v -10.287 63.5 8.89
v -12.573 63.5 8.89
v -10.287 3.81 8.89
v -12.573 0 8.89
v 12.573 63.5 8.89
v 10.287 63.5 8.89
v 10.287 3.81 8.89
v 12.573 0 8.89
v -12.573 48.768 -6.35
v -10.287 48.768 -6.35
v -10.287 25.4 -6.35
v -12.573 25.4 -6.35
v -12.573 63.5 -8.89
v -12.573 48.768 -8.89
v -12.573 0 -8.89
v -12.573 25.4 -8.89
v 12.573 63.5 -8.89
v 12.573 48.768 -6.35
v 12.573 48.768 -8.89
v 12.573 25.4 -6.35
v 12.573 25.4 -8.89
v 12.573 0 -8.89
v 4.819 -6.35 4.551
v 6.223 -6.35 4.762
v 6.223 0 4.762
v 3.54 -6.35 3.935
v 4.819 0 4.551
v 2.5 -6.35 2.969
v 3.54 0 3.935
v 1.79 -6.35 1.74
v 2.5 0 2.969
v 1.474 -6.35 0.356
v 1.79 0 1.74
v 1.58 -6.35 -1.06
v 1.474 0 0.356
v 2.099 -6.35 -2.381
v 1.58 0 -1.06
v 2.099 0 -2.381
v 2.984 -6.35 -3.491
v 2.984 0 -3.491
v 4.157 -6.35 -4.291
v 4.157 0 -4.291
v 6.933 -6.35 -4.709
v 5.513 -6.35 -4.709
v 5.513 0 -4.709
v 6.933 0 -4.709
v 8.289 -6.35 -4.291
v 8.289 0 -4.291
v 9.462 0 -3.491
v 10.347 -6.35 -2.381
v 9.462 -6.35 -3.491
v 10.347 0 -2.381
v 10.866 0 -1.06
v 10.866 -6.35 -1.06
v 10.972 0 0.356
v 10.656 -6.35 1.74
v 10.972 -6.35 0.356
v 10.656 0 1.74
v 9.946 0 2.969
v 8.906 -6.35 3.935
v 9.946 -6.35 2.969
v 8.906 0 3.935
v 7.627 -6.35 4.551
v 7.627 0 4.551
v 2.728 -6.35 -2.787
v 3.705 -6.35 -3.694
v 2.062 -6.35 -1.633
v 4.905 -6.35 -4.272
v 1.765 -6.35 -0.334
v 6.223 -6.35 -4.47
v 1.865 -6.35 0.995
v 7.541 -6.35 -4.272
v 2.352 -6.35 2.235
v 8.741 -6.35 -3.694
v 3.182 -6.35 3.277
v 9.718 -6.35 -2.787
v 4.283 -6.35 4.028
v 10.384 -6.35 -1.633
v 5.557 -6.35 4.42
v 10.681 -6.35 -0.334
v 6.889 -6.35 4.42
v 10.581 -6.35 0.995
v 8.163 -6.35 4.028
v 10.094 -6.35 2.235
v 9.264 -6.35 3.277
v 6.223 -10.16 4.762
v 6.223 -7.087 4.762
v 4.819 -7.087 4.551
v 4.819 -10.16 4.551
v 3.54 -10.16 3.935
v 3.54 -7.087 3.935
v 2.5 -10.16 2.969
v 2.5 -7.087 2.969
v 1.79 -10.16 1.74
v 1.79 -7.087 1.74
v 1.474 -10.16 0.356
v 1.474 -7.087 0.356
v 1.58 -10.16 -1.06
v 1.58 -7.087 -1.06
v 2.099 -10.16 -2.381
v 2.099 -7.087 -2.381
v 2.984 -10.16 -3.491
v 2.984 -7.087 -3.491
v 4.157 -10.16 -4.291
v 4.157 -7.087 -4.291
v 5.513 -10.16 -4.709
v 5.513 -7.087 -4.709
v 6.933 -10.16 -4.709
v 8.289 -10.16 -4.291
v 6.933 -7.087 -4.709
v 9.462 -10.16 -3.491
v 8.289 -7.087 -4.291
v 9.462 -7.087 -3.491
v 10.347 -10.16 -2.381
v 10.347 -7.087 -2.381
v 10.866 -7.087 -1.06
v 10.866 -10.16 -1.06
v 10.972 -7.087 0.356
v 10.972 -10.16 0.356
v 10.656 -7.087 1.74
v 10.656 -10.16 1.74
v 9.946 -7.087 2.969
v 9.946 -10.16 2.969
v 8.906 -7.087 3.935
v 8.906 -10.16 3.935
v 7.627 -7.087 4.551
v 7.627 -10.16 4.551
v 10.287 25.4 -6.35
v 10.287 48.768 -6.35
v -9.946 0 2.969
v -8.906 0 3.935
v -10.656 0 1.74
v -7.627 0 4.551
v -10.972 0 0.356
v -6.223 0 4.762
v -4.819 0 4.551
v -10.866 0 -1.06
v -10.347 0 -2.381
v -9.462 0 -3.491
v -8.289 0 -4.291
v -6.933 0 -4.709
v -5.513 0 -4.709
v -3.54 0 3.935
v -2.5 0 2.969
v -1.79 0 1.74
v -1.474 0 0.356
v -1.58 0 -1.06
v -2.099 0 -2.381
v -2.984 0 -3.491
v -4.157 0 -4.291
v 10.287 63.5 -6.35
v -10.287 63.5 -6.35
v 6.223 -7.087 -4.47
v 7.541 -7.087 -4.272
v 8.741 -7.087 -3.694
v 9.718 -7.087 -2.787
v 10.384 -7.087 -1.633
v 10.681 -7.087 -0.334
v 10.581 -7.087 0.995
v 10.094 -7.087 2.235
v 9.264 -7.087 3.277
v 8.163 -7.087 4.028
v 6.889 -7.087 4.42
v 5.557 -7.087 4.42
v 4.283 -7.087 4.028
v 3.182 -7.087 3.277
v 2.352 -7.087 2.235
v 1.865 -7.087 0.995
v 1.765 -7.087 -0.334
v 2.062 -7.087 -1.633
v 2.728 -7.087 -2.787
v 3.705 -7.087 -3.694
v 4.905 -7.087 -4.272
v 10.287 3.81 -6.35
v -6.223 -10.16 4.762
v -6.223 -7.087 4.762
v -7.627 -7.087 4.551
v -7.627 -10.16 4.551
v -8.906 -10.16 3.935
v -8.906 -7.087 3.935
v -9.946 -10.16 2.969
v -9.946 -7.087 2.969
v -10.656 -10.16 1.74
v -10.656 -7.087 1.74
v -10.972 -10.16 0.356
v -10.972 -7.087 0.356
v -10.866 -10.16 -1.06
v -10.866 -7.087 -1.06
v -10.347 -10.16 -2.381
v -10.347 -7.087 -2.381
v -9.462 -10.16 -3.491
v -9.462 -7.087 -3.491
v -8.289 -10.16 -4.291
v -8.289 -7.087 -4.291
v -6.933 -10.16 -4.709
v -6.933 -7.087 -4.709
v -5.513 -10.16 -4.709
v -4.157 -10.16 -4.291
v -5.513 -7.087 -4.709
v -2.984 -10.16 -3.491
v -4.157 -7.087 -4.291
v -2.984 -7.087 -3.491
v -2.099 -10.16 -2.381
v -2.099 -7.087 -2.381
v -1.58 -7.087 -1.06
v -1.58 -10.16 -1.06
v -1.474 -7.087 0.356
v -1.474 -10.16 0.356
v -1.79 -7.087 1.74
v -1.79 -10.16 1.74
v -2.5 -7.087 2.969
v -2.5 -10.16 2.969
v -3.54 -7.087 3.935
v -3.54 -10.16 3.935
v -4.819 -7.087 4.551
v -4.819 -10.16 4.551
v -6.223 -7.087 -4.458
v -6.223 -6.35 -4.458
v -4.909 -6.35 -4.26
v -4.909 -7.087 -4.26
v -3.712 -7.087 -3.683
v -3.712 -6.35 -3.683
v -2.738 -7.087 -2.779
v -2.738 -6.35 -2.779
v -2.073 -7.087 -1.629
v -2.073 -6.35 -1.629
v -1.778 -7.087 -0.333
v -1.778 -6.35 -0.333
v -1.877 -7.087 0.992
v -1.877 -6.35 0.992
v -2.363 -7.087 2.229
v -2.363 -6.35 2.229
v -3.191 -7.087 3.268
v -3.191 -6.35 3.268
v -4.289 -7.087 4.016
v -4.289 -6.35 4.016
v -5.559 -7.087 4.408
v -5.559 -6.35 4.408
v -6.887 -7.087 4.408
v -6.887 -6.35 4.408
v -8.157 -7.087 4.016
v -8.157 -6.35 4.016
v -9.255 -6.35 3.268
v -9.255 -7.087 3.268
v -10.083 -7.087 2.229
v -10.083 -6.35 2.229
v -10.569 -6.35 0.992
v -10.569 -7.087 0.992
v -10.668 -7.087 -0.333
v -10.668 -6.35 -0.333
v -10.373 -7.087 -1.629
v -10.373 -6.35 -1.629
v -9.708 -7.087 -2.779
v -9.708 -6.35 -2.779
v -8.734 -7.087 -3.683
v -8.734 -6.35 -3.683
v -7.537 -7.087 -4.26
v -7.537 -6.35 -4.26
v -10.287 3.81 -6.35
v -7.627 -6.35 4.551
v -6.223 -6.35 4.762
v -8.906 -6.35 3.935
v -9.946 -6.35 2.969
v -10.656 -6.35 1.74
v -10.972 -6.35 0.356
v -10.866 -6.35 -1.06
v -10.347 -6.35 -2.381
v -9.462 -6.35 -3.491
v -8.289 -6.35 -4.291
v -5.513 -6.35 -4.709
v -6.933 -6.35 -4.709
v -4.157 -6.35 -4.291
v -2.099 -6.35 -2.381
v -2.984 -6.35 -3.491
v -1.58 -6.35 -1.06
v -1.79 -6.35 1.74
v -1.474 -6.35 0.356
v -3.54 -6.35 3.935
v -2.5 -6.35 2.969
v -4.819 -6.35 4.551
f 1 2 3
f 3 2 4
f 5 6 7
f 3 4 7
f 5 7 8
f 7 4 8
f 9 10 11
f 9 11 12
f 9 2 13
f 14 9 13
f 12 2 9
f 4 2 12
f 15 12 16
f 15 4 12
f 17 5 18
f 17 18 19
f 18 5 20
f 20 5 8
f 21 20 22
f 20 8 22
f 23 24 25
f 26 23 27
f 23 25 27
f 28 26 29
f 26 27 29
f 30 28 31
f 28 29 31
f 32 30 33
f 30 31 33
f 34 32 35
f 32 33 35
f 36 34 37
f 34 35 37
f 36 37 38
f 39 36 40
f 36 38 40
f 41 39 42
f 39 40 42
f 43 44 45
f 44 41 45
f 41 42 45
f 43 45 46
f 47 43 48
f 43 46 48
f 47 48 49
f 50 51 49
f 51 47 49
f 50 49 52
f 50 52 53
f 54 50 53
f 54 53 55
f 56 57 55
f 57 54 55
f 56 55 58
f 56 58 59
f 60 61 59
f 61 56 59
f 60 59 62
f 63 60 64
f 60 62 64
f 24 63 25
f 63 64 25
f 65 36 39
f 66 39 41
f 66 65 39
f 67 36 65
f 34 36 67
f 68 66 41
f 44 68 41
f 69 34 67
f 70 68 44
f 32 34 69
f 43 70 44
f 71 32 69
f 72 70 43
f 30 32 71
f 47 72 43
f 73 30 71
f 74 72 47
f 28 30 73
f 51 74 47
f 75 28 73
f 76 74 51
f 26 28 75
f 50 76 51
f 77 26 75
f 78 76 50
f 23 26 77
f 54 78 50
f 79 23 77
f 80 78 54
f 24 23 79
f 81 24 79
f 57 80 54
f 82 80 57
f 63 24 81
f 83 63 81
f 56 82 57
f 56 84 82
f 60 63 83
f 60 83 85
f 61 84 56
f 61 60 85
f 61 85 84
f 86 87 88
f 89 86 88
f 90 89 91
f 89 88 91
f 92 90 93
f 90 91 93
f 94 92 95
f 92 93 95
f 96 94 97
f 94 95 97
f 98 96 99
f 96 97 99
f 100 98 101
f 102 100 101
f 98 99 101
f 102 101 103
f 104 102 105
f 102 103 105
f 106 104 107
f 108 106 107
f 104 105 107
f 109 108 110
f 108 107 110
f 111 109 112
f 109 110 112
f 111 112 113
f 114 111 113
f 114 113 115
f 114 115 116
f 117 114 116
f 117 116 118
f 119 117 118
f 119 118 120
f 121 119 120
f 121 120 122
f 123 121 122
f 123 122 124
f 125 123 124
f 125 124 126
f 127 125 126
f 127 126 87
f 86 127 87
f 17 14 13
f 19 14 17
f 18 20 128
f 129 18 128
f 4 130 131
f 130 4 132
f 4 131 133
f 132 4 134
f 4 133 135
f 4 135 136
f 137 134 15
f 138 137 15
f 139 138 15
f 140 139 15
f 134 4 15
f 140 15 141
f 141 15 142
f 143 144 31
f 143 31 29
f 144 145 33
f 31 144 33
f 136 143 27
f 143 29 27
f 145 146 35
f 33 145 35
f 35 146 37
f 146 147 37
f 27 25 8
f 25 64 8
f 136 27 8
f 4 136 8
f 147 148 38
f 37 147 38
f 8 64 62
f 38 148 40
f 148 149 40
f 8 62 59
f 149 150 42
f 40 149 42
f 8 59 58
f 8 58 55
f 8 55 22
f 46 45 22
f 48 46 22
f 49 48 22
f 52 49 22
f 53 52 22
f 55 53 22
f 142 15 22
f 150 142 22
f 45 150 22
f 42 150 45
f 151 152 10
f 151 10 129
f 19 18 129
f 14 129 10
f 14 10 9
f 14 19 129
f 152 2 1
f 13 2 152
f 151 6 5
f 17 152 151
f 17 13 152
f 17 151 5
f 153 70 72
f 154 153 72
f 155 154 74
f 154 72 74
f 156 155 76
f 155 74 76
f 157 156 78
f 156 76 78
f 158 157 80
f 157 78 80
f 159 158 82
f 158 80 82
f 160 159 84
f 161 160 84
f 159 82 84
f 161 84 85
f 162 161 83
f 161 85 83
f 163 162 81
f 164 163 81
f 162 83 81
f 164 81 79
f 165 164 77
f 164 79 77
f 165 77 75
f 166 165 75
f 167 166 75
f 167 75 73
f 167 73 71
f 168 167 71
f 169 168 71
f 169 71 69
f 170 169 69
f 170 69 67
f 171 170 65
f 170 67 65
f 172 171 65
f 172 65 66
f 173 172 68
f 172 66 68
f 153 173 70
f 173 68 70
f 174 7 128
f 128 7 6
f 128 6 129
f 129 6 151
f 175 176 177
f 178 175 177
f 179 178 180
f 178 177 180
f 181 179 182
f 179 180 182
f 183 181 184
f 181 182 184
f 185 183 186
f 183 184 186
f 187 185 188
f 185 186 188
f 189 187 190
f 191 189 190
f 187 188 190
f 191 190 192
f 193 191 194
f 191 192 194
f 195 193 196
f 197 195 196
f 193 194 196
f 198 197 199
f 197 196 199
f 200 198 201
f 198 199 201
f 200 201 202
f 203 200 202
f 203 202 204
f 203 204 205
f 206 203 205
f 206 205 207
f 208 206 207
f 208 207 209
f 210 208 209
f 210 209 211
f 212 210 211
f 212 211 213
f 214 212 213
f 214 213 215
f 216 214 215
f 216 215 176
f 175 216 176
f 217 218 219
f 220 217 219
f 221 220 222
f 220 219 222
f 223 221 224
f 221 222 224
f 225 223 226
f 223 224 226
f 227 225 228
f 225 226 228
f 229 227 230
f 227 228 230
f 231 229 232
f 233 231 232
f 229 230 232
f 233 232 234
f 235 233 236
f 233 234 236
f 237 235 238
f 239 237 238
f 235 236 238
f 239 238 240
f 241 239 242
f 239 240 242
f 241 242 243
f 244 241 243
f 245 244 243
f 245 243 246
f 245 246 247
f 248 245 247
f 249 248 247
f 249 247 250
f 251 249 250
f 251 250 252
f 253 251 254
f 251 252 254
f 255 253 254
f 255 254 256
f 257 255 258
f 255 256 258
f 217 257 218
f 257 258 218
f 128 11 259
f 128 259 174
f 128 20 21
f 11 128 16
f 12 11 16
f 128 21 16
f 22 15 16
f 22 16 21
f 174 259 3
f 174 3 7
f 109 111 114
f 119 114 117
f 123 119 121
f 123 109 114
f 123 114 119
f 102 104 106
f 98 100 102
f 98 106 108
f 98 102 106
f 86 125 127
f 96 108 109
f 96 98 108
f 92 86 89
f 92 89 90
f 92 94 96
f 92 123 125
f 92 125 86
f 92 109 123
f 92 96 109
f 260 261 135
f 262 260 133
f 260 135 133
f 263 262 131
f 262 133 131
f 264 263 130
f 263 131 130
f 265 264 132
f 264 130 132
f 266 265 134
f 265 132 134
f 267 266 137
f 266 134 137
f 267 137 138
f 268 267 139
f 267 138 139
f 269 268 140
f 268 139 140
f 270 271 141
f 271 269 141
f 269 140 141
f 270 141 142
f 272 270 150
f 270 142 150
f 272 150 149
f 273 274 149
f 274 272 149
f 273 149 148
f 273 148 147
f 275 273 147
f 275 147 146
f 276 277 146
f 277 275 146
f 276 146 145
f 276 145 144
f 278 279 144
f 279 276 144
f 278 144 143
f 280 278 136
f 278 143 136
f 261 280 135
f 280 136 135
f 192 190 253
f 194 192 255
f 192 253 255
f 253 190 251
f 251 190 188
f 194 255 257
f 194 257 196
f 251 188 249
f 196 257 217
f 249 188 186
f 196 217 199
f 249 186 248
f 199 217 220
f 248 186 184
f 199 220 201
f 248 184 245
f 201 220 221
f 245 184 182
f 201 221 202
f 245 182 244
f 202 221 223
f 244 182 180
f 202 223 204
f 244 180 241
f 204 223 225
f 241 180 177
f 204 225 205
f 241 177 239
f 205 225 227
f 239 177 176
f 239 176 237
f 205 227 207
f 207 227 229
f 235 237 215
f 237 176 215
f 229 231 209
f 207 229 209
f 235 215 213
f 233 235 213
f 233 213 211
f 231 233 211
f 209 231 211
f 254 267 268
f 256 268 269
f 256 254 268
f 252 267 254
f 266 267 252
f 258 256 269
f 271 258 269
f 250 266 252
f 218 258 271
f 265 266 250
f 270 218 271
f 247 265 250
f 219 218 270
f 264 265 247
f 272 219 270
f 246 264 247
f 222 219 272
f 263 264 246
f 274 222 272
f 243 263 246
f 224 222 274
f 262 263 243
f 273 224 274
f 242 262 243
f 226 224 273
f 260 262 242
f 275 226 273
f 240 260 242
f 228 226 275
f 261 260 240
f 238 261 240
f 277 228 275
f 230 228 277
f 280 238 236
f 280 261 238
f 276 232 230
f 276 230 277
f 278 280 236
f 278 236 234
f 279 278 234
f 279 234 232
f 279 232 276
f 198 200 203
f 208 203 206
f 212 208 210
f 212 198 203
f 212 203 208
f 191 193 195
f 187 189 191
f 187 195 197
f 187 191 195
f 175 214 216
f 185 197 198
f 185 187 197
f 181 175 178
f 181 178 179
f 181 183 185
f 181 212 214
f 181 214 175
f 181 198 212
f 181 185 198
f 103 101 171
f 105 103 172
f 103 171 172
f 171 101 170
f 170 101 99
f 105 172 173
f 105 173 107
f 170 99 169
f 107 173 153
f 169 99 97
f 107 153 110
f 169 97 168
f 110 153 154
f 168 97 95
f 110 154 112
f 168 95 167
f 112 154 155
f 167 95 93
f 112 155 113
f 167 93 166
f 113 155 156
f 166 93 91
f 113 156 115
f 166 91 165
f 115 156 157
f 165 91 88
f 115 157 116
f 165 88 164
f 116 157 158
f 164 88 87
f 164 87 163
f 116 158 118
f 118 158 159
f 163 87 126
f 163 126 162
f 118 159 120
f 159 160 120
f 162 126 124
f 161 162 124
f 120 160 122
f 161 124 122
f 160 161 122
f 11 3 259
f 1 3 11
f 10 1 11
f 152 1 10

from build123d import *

# Parameters (mm, degrees)
SKETCH2_W           = 25.146
SKETCH2_H           = 17.78
BOSS_EXTRUDE1_DEPTH = 63.5
SKETCH3_W           = 20.574
SKETCH3_H           = 15.24
CUT_EXTRUDE1_DEPTH  = 59.69
SKETCH4_R           = 4.7625
BOSS_EXTRUDE2_DEPTH = 10.16
F_3DSKETCH1_R       = 5.08
CUT_EXTRUDE2_DEPTH  = 0.7366
SKETCH5_R           = 4.4577
SKETCH5_R_2         = 4.4704
BOSS_EXTRUDE3_DEPTH = 0.7366
SKETCH6_W           = 25.146
SKETCH6_H           = 23.368
CUT_EXTRUDE3_DEPTH  = 2.54


with BuildPart() as part:
    # Sketch2 → Boss-Extrude1 (new body)
    with BuildSketch(Plane(origin=(0, 0, 0), x_dir=(1, 0, 0), z_dir=(0, 1, 0))):
        Rectangle(SKETCH2_W, SKETCH2_H)
    extrude(amount=BOSS_EXTRUDE1_DEPTH)

    # Sketch3 → Cut-Extrude1 (cut)
    with BuildSketch(Plane(origin=(0, 63.5, 0), x_dir=(1, 0, 0), z_dir=(0, 1, 0))):
        with Locations((0, -1.27)):
            Rectangle(SKETCH3_W, SKETCH3_H)
    extrude(amount=-CUT_EXTRUDE1_DEPTH, mode=Mode.SUBTRACT)

    # Sketch4 → Boss-Extrude2 (add)
    with BuildSketch(Plane(origin=(0, 0, 0), x_dir=(-1, 0, 0), z_dir=(0, -1, 0))):
        with Locations(Location((6.223, 0, 0), (0, 0, 270))):
            Circle(SKETCH4_R)
        with Locations(Location((-6.223, 0, 0), (0, 0, 270))):
            Circle(SKETCH4_R)
    extrude(amount=BOSS_EXTRUDE2_DEPTH)

    # 3DSketch1 → Cut-Extrude2 (cut)
    with BuildSketch(Plane(origin=(-6.223, -6.35, 0), x_dir=(1, 0, 0), z_dir=(0, -1, 0))):
        Circle(F_3DSKETCH1_R)
        with Locations((12.446, 0)):
            Circle(F_3DSKETCH1_R)
    extrude(amount=CUT_EXTRUDE2_DEPTH, mode=Mode.SUBTRACT)


with BuildPart() as cut_extrude2_piece_1:
    # of the separate pieces the step leaves, piece 1, a body of its own (cut_extrude2_pieces)
    add(part.part.solids().sort_by_distance((-12.573, 0, -8.89))[0])



with BuildPart() as cut_extrude2_piece_2:
    # of the separate pieces the step leaves, piece 2, a body of its own (cut_extrude2_pieces)
    add(part.part.solids().sort_by_distance((6.223, -7.0866, 4.7625))[0])


with BuildPart() as cut_extrude2_piece_3:
    # of the separate pieces the step leaves, piece 3, a body of its own (cut_extrude2_pieces)
    add(part.part.solids().sort_by_distance((-6.223, -7.0866, 4.7625))[0])


with BuildPart() as cut_extrude2_piece_1_1:
    add(cut_extrude2_piece_1.part)

    add(cut_extrude2_piece_2.part)  # Boss-Extrude3 merges Cut-Extrude2 piece 2

    add(cut_extrude2_piece_3.part)  # Boss-Extrude3 merges Cut-Extrude2 piece 3
    # Sketch5 → Boss-Extrude3 (add)
    with BuildSketch(Plane(origin=(0, -6.35, 0), x_dir=(-1, 0, 0), z_dir=(0, -1, 0))):
        with Locations(Location((6.223, 0, 0), (0, 0, 90))):
            Circle(SKETCH5_R)
        with Locations(Location((-6.223, 0, 0), (0, 0, 90))):
            Circle(SKETCH5_R_2)
    extrude(amount=BOSS_EXTRUDE3_DEPTH)

    # Sketch6 → Cut-Extrude3 (cut)
    with BuildSketch(Plane(origin=(0, 0, -8.89), x_dir=(-1, 0, 0), z_dir=(0, 0, -1))):
        with Locations((0, 37.084)):
            Rectangle(SKETCH6_W, SKETCH6_H)
    extrude(amount=-CUT_EXTRUDE3_DEPTH, mode=Mode.SUBTRACT)


solid = cut_extrude2_piece_1_1.part
